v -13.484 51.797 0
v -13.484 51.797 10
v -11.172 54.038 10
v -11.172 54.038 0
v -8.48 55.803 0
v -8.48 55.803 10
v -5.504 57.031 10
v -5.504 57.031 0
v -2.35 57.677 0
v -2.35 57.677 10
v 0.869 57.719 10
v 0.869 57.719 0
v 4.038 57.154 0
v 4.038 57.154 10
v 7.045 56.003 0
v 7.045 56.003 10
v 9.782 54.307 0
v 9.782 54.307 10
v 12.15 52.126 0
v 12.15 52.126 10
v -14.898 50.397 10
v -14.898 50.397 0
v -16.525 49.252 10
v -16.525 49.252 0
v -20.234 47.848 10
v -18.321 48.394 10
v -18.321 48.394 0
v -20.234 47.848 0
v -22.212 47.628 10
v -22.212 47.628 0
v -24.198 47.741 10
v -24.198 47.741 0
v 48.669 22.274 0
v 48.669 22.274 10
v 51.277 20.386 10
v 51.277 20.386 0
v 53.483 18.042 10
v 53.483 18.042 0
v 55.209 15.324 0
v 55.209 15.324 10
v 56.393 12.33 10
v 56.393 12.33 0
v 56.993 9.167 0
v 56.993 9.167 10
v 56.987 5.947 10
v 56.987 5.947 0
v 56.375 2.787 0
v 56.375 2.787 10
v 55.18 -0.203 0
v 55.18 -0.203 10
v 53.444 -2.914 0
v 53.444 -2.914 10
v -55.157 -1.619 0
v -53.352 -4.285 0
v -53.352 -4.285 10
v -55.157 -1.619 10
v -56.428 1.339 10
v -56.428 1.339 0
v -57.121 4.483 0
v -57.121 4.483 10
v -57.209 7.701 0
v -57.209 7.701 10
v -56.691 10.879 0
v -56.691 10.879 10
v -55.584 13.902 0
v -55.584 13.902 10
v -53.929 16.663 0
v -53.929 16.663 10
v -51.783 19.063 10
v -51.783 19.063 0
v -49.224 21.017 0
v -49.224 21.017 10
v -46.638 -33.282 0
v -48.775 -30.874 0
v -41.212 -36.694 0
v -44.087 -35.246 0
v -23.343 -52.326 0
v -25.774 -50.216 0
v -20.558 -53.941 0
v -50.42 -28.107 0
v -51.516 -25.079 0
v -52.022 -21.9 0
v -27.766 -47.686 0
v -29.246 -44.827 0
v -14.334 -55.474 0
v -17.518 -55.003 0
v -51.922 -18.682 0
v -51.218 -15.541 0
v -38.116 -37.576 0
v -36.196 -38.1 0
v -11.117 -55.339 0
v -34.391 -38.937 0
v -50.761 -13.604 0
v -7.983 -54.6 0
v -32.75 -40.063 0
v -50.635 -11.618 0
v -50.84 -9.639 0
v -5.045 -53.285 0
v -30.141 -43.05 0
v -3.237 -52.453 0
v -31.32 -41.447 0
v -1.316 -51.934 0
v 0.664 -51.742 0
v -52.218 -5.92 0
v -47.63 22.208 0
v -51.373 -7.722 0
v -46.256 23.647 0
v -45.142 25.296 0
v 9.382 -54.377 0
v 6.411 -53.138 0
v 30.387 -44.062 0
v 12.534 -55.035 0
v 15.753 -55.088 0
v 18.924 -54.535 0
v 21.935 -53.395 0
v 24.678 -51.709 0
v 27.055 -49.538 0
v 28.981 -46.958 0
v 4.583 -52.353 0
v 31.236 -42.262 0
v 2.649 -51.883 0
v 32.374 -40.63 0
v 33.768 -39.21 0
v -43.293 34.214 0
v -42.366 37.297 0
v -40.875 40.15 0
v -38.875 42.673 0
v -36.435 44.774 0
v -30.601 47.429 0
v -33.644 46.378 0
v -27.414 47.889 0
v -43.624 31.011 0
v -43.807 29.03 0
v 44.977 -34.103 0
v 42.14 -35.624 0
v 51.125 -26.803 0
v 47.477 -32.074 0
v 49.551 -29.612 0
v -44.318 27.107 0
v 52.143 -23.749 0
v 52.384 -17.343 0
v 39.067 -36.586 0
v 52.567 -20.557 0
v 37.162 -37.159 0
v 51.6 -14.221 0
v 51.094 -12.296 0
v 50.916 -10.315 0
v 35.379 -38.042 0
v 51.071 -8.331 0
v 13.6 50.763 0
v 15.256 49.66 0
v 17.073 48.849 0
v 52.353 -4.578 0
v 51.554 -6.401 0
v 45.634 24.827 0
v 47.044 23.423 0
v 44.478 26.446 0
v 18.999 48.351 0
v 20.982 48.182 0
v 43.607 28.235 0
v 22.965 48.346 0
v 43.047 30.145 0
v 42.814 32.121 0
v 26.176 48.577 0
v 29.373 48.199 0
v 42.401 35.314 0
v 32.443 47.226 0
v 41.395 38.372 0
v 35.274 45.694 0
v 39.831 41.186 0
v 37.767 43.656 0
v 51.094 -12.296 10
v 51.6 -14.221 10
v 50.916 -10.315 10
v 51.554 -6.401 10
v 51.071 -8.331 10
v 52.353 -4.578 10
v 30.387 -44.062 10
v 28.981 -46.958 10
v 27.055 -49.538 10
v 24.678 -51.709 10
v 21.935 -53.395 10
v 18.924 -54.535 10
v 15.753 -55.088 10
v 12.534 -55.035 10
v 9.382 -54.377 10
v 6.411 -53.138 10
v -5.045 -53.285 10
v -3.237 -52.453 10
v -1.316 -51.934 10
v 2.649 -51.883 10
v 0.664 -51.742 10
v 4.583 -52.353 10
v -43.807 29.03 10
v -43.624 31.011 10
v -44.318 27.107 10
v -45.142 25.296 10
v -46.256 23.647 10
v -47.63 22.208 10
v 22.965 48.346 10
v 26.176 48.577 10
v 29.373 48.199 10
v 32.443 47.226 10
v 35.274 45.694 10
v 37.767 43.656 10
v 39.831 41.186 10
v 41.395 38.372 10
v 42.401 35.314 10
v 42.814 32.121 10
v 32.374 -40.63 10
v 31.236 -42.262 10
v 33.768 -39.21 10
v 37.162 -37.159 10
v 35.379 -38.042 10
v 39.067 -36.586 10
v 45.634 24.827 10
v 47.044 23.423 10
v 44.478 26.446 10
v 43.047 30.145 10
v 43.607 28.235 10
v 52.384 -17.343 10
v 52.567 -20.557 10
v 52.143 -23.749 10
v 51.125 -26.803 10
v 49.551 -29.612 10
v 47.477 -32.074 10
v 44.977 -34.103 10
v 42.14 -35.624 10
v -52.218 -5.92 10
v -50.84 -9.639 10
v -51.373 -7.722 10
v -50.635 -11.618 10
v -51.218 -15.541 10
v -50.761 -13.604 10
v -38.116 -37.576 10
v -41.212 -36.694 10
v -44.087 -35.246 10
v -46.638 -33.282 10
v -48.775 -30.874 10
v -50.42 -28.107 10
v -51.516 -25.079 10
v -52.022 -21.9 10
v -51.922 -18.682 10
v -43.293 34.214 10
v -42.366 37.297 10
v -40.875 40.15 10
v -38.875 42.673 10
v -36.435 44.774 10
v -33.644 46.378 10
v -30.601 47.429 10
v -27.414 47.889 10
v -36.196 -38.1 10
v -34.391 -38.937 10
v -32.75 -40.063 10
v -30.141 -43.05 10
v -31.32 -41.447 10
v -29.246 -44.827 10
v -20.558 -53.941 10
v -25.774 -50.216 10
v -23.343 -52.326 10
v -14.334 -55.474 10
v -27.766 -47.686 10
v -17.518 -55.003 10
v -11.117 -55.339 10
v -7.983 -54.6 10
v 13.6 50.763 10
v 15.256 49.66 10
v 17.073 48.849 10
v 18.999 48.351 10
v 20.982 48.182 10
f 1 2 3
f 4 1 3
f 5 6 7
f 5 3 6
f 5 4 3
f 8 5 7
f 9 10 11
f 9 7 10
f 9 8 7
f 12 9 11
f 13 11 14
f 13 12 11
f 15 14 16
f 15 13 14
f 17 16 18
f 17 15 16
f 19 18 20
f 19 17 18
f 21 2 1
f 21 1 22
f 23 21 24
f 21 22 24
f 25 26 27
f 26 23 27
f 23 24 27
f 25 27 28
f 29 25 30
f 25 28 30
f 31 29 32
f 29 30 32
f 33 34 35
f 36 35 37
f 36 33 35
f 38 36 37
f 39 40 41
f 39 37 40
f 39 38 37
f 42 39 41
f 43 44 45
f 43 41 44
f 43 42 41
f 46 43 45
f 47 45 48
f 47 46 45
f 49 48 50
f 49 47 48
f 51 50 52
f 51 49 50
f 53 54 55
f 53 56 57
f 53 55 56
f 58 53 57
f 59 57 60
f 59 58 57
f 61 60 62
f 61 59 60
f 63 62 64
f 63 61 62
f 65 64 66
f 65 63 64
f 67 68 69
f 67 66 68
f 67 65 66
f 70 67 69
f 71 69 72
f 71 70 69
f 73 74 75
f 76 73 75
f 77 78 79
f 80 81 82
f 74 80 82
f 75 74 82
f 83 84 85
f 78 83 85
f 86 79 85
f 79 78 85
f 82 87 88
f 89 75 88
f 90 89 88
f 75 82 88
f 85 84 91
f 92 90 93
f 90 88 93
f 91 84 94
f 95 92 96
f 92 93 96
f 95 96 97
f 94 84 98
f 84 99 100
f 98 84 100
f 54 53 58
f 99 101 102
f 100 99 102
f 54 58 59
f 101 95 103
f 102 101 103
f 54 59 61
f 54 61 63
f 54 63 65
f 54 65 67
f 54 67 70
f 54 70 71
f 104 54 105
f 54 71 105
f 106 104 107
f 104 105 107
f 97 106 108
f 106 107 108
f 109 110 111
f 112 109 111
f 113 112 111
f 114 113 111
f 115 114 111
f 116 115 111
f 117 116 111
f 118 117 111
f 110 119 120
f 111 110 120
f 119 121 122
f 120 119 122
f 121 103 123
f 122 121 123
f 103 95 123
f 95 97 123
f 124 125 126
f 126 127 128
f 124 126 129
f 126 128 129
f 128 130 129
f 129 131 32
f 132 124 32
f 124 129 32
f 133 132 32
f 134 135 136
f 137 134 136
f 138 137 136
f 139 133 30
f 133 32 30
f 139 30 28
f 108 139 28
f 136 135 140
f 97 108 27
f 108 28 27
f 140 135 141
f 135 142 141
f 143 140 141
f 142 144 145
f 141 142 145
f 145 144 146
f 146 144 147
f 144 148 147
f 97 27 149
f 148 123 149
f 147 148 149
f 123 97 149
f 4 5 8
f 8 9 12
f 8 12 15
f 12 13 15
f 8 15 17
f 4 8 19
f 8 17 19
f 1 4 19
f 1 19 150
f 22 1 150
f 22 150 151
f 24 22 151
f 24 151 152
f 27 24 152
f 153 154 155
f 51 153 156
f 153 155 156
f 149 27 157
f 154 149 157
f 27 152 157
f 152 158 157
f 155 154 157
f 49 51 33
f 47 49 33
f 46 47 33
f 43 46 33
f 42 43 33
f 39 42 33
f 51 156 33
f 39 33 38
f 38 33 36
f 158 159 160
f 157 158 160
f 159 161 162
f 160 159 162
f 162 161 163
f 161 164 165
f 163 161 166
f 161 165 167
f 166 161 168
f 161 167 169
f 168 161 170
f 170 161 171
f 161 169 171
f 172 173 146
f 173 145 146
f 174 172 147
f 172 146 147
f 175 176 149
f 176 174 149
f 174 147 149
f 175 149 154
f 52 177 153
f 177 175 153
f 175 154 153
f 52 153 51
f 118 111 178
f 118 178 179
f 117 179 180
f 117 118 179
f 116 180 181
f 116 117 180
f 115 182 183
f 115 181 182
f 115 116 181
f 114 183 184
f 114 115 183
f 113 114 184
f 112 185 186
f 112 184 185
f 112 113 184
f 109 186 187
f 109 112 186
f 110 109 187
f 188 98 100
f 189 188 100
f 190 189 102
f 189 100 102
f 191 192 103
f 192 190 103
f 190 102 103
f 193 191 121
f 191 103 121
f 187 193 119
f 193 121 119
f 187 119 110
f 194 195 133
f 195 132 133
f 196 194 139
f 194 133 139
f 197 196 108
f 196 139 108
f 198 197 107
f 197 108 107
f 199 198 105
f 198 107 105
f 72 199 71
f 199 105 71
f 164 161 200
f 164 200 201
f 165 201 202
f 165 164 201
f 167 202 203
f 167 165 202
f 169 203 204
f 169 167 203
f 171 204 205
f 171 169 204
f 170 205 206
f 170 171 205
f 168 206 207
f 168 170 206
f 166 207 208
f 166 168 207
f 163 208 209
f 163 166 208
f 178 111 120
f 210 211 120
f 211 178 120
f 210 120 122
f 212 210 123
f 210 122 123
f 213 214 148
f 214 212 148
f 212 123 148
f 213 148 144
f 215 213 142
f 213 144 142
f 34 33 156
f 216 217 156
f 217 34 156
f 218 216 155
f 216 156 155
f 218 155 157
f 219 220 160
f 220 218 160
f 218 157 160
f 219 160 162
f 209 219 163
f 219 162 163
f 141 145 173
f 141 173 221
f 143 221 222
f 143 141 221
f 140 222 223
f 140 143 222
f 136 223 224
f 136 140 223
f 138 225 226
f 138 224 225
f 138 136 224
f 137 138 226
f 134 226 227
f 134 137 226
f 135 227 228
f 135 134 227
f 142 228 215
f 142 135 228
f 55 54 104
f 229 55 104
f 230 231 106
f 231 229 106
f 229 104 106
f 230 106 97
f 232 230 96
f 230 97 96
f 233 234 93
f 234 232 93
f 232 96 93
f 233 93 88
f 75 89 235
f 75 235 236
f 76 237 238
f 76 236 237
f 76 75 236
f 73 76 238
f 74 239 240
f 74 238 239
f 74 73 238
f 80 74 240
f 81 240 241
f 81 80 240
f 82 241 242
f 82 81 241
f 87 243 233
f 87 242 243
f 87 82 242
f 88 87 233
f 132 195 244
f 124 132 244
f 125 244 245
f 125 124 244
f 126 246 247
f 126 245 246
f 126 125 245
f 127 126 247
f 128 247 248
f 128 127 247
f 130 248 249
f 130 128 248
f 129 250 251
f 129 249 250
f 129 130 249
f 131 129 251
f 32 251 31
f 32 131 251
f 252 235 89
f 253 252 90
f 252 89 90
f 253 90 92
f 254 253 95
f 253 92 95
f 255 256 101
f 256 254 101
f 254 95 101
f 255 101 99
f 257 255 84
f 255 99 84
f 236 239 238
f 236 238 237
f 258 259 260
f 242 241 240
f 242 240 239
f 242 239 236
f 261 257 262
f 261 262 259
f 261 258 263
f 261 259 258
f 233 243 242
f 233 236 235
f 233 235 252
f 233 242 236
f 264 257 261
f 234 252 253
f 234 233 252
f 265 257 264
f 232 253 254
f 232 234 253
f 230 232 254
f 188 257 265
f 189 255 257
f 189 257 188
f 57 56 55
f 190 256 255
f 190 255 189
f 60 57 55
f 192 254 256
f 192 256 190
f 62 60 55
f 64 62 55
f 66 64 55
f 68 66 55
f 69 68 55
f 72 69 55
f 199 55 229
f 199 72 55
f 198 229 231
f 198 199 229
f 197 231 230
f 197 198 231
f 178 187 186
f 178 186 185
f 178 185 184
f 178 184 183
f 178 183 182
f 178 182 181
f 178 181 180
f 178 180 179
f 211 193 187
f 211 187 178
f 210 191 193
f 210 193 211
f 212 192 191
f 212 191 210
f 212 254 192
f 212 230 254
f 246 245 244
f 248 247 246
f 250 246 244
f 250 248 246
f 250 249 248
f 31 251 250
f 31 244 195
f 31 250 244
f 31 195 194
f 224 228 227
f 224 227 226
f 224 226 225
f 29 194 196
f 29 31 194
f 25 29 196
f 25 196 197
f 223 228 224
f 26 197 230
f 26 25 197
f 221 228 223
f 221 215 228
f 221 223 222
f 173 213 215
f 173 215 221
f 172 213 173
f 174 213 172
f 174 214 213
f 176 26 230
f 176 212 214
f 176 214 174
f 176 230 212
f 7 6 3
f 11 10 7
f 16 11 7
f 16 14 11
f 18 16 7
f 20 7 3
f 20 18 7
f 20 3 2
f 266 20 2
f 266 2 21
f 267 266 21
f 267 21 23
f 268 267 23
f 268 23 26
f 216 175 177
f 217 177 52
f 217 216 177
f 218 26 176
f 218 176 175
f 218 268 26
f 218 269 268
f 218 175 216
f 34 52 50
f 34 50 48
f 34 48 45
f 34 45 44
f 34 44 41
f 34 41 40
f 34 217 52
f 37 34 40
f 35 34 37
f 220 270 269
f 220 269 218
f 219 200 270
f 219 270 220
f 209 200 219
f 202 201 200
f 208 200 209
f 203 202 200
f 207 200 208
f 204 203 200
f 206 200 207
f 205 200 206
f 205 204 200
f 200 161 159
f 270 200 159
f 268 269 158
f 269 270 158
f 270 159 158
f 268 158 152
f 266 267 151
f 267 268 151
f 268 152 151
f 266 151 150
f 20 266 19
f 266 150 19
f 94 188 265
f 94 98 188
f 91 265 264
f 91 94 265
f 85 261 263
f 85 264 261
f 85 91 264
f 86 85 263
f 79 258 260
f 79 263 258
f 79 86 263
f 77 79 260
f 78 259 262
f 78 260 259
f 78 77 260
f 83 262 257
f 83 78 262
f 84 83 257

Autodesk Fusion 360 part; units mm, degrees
sketch "Sketch3" plane through (0, 0, 0) normal (0, 0, 1) x (1, 0, 0)
  arc A0 (12.1503, 52.1262) -> (-13.4843, 51.7971) centre (-0.5229, 40.7362) ccw
  arc A1 (42.8137, 32.1209) -> (22.965, 48.3464) centre (25.7842, 31.5419) ccw
  arc A2 (53.4441, -2.9141) -> (48.6687, 22.2739) centre (40.0266, 7.5887) ccw
  arc A3 (39.0674, -36.5855) -> (51.5997, -14.2208) centre (35.5401, -19.9153) ccw
  arc A4 (6.4107, -53.1382) -> (30.3867, -44.0615) centre (14.424, -38.1007) ccw
  arc A5 (-29.2457, -44.8269) -> (-5.0446, -53.2853) centre (-13.4412, -38.4584) ccw
  arc A6 (-51.2177, -15.5406) -> (-38.1155, -37.5763) centre (-35.0172, -20.821) ccw
  arc A7 (-24.1984, 47.741) -> (-43.6241, 31.0114) centre (-26.5853, 30.8696) ccw
  arc A8 (-49.2244, 21.0173) -> (-53.3517, -4.2849) centre (-40.2082, 6.5588) ccw
  arc A9 (-49.2244, 21.0173) -> (-43.6241, 31.0114) centre (-55.5183, 31.1103) ccw
  arc A10 (-24.1984, 47.741) -> (-13.4843, 51.7971) centre (-22.5322, 59.5183) ccw
  arc A11 (12.1503, 52.1262) -> (22.965, 48.3464) centre (20.997, 60.0771) ccw
  arc A12 (42.8137, 32.1209) -> (48.6687, 22.2739) centre (54.7014, 32.5251) ccw
  arc A13 (53.4441, -2.9141) -> (51.5997, -14.2208) centre (62.8105, -10.2457) ccw
  arc A14 (39.0674, -36.5855) -> (30.3867, -44.0615) centre (41.5298, -48.2225) ccw
  arc A15 (6.4107, -53.1382) -> (-5.0446, -53.2853) centre (0.8168, -63.6354) ccw
  arc A16 (-29.2457, -44.8269) -> (-38.1155, -37.5763) centre (-40.2783, -49.2726) ccw
  arc A17 (-51.2177, -15.5406) -> (-53.3517, -4.2849) centre (-62.5268, -11.8546) ccw
  dimension "d14" = 11.8946
extrude "Extrude1" add sketch "Sketch3" along normal blind 10
